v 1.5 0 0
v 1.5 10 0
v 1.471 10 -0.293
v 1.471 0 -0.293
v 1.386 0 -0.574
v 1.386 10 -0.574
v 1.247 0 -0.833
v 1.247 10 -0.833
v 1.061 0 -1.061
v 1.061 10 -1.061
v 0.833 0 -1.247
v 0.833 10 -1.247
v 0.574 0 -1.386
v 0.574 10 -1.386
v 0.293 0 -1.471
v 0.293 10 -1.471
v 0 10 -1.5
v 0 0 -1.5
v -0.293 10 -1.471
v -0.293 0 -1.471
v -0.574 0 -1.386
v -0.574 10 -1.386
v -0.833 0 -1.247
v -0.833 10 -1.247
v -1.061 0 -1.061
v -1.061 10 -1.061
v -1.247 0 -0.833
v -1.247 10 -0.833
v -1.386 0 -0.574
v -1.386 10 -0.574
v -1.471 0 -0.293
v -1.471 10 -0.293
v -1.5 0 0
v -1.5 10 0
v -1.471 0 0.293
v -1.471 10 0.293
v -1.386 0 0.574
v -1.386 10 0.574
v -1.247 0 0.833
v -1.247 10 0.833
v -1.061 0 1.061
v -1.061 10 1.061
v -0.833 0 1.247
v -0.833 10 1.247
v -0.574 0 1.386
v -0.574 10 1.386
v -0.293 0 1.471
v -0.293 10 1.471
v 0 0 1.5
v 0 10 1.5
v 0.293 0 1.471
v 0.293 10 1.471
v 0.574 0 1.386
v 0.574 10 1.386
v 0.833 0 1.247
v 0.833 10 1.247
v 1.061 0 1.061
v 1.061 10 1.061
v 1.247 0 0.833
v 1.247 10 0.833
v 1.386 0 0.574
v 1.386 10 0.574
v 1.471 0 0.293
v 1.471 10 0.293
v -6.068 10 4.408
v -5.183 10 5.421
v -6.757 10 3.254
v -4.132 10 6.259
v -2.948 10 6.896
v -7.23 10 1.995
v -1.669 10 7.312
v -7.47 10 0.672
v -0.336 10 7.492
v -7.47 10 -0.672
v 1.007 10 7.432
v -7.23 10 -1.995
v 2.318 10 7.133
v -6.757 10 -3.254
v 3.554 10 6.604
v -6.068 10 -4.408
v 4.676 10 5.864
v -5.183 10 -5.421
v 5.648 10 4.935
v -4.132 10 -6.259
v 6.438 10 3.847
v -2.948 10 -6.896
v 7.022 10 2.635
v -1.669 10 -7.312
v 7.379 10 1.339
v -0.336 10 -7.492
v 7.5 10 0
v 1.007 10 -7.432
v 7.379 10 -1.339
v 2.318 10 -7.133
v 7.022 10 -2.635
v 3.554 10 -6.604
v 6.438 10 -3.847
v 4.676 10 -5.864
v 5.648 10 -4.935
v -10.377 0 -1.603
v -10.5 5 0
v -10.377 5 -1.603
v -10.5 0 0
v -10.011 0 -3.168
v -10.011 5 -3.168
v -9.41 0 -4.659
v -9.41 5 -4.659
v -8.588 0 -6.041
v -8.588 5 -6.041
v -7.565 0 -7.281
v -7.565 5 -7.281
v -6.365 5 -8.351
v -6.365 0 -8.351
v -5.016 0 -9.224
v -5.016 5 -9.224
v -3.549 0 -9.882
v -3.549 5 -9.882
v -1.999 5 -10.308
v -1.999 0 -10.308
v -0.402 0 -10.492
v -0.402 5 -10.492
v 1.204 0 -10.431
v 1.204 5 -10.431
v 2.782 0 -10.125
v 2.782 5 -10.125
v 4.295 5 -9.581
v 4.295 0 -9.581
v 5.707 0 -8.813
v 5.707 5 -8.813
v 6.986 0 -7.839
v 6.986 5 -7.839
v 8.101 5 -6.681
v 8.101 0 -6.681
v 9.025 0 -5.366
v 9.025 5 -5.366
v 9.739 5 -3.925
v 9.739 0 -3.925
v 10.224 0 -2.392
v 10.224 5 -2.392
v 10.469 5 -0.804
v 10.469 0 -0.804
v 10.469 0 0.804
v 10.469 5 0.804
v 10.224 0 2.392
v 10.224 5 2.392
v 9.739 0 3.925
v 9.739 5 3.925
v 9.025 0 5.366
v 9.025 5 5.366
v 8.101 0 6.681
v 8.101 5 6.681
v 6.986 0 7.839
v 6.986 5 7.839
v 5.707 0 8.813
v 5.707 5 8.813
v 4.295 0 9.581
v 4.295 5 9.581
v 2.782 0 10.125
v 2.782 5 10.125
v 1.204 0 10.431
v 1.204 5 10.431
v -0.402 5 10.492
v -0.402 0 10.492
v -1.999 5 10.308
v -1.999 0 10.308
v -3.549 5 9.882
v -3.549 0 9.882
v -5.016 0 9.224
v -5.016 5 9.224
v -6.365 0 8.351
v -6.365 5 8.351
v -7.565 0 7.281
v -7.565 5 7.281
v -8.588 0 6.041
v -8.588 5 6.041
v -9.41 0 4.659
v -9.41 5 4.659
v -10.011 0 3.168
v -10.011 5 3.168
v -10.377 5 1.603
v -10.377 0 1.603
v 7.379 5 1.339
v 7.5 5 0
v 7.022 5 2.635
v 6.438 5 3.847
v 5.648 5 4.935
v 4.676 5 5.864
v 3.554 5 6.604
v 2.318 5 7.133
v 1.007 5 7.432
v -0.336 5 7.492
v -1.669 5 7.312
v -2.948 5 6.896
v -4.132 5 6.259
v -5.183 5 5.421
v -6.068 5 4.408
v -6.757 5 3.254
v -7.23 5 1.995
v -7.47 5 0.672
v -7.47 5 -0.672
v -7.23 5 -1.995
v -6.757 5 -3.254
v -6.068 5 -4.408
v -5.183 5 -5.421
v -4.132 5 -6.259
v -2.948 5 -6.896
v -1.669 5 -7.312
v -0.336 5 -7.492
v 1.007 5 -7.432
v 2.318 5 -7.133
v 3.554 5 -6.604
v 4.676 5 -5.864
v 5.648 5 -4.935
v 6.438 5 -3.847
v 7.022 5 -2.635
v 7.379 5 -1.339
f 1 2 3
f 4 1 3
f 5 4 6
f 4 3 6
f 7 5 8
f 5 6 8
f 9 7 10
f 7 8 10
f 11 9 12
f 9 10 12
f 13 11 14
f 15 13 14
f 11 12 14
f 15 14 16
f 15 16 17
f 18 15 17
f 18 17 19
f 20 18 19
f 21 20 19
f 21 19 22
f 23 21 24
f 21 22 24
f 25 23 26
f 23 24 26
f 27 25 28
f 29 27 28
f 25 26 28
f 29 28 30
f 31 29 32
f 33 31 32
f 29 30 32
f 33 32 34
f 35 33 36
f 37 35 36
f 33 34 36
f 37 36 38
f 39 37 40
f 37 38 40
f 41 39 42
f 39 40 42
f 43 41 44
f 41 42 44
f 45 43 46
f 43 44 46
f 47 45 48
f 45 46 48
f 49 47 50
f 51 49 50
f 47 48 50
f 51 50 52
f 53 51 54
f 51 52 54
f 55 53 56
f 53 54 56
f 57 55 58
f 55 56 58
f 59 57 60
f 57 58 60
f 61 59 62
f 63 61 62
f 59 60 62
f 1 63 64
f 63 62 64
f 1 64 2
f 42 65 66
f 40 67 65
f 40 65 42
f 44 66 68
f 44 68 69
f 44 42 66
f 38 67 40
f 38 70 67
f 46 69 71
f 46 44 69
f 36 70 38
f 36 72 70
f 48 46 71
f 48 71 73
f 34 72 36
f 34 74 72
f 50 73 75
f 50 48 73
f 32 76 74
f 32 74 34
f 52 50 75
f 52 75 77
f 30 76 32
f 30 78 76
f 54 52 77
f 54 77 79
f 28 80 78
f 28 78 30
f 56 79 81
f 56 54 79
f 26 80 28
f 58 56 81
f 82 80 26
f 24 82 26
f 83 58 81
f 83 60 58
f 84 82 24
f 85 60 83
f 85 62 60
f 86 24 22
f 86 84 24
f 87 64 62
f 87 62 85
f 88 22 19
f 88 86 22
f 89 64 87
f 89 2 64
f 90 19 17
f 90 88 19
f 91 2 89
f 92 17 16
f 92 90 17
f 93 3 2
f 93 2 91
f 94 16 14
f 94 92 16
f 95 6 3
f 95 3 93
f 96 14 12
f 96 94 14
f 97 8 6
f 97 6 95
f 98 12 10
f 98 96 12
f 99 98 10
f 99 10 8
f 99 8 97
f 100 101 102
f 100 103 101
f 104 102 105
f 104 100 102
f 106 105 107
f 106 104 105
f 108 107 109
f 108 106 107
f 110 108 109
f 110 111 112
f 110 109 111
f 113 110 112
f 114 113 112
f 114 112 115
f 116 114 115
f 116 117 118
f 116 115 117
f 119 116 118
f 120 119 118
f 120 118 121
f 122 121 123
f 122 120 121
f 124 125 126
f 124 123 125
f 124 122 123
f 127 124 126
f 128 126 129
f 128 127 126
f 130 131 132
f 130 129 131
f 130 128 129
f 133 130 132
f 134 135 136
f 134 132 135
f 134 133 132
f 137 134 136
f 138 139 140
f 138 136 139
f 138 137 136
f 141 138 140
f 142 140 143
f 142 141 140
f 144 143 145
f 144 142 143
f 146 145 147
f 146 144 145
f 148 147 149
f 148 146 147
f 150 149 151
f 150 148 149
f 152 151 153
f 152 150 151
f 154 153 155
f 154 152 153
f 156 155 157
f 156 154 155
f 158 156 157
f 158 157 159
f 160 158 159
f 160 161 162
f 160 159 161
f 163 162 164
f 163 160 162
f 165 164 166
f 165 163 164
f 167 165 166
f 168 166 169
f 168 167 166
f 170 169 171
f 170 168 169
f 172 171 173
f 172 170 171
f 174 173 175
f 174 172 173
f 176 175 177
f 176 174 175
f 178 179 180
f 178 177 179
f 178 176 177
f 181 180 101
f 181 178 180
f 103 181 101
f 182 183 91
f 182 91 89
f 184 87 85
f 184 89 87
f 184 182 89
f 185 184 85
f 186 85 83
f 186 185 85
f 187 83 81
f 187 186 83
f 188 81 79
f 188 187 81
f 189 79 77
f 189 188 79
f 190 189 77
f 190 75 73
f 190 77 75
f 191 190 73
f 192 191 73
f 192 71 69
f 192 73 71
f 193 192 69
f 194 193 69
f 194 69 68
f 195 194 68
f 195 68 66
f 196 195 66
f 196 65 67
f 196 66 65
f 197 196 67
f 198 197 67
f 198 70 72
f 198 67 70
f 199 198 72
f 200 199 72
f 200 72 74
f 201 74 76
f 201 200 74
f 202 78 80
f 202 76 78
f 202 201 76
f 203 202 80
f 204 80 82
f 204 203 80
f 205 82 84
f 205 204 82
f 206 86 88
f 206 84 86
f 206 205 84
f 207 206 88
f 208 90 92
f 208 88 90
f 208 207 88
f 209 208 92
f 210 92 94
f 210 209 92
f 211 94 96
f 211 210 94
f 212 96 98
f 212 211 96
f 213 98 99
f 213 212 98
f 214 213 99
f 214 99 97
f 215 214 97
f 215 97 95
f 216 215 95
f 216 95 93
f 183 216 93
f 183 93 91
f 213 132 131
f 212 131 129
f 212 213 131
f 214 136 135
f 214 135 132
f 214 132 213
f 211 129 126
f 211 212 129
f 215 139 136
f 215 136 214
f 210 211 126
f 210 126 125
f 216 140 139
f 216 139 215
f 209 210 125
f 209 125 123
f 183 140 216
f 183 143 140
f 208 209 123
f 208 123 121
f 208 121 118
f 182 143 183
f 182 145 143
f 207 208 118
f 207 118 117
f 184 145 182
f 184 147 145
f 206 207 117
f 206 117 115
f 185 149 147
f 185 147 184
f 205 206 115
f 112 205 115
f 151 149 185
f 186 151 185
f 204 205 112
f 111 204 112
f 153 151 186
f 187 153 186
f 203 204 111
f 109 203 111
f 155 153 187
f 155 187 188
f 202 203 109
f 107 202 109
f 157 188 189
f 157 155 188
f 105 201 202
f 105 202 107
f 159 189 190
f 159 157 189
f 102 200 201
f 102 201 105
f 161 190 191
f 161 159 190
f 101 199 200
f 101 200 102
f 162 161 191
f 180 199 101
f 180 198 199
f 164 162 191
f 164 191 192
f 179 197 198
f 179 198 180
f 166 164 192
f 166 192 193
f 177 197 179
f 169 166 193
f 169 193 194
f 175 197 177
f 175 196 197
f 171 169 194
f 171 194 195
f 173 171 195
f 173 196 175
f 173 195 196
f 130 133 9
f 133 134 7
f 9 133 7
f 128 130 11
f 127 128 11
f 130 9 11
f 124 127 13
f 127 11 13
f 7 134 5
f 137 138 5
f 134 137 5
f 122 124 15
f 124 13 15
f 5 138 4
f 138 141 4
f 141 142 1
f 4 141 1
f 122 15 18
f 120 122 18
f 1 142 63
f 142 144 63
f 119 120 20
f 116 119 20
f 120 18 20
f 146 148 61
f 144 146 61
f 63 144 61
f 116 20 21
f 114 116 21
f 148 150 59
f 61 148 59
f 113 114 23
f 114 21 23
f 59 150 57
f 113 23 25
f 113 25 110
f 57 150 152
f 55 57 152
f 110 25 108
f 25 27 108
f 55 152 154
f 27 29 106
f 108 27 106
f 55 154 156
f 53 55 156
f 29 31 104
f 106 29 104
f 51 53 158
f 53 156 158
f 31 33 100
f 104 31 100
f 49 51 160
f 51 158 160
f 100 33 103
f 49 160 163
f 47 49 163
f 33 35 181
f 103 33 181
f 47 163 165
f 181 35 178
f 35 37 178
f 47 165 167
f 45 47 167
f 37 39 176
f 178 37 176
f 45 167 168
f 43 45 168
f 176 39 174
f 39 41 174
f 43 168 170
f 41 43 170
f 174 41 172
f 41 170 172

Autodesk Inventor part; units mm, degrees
ref_plane "YZ Plane" through (0, 0, 0) normal (1, 0, 0) x (0, 1, 0)
ref_plane "XZ Plane" through (0, 0, 0) normal (0, 1, 0) x (-1, 0, 0)
ref_plane "XY Plane" through (0, 0, 0) normal (0, 0, 1) x (1, 0, 0)
sketch "Sketch1" plane through (0, 0, 0) normal (0, 1, 0) x (-1, 0, 0)
  circle A0 centre (0, 0) radius 10.5
  dimension "d0" = 21
extrude "Extrusion1" add sketch "Sketch1" along normal blind 5
sketch "Sketch2" plane through (0, 5, 0) normal (0, 1, 0) x (1, 0, 0)
  circle A0 centre (0, 0) radius 7.5
  dimension "d3" = 15
extrude "Extrusion2" add sketch "Sketch2" along normal blind 5
sketch "Sketch3" plane through (0, 10, 0) normal (0, 1, 0) x (1, 0, 0)
  circle A0 centre (0, 0) radius 1.5
  dimension "d6" = 3
extrude "Extrusion3" cut sketch "Sketch3" against normal through all
properties part number "Gear" material "Brass, Soft Yellow"
